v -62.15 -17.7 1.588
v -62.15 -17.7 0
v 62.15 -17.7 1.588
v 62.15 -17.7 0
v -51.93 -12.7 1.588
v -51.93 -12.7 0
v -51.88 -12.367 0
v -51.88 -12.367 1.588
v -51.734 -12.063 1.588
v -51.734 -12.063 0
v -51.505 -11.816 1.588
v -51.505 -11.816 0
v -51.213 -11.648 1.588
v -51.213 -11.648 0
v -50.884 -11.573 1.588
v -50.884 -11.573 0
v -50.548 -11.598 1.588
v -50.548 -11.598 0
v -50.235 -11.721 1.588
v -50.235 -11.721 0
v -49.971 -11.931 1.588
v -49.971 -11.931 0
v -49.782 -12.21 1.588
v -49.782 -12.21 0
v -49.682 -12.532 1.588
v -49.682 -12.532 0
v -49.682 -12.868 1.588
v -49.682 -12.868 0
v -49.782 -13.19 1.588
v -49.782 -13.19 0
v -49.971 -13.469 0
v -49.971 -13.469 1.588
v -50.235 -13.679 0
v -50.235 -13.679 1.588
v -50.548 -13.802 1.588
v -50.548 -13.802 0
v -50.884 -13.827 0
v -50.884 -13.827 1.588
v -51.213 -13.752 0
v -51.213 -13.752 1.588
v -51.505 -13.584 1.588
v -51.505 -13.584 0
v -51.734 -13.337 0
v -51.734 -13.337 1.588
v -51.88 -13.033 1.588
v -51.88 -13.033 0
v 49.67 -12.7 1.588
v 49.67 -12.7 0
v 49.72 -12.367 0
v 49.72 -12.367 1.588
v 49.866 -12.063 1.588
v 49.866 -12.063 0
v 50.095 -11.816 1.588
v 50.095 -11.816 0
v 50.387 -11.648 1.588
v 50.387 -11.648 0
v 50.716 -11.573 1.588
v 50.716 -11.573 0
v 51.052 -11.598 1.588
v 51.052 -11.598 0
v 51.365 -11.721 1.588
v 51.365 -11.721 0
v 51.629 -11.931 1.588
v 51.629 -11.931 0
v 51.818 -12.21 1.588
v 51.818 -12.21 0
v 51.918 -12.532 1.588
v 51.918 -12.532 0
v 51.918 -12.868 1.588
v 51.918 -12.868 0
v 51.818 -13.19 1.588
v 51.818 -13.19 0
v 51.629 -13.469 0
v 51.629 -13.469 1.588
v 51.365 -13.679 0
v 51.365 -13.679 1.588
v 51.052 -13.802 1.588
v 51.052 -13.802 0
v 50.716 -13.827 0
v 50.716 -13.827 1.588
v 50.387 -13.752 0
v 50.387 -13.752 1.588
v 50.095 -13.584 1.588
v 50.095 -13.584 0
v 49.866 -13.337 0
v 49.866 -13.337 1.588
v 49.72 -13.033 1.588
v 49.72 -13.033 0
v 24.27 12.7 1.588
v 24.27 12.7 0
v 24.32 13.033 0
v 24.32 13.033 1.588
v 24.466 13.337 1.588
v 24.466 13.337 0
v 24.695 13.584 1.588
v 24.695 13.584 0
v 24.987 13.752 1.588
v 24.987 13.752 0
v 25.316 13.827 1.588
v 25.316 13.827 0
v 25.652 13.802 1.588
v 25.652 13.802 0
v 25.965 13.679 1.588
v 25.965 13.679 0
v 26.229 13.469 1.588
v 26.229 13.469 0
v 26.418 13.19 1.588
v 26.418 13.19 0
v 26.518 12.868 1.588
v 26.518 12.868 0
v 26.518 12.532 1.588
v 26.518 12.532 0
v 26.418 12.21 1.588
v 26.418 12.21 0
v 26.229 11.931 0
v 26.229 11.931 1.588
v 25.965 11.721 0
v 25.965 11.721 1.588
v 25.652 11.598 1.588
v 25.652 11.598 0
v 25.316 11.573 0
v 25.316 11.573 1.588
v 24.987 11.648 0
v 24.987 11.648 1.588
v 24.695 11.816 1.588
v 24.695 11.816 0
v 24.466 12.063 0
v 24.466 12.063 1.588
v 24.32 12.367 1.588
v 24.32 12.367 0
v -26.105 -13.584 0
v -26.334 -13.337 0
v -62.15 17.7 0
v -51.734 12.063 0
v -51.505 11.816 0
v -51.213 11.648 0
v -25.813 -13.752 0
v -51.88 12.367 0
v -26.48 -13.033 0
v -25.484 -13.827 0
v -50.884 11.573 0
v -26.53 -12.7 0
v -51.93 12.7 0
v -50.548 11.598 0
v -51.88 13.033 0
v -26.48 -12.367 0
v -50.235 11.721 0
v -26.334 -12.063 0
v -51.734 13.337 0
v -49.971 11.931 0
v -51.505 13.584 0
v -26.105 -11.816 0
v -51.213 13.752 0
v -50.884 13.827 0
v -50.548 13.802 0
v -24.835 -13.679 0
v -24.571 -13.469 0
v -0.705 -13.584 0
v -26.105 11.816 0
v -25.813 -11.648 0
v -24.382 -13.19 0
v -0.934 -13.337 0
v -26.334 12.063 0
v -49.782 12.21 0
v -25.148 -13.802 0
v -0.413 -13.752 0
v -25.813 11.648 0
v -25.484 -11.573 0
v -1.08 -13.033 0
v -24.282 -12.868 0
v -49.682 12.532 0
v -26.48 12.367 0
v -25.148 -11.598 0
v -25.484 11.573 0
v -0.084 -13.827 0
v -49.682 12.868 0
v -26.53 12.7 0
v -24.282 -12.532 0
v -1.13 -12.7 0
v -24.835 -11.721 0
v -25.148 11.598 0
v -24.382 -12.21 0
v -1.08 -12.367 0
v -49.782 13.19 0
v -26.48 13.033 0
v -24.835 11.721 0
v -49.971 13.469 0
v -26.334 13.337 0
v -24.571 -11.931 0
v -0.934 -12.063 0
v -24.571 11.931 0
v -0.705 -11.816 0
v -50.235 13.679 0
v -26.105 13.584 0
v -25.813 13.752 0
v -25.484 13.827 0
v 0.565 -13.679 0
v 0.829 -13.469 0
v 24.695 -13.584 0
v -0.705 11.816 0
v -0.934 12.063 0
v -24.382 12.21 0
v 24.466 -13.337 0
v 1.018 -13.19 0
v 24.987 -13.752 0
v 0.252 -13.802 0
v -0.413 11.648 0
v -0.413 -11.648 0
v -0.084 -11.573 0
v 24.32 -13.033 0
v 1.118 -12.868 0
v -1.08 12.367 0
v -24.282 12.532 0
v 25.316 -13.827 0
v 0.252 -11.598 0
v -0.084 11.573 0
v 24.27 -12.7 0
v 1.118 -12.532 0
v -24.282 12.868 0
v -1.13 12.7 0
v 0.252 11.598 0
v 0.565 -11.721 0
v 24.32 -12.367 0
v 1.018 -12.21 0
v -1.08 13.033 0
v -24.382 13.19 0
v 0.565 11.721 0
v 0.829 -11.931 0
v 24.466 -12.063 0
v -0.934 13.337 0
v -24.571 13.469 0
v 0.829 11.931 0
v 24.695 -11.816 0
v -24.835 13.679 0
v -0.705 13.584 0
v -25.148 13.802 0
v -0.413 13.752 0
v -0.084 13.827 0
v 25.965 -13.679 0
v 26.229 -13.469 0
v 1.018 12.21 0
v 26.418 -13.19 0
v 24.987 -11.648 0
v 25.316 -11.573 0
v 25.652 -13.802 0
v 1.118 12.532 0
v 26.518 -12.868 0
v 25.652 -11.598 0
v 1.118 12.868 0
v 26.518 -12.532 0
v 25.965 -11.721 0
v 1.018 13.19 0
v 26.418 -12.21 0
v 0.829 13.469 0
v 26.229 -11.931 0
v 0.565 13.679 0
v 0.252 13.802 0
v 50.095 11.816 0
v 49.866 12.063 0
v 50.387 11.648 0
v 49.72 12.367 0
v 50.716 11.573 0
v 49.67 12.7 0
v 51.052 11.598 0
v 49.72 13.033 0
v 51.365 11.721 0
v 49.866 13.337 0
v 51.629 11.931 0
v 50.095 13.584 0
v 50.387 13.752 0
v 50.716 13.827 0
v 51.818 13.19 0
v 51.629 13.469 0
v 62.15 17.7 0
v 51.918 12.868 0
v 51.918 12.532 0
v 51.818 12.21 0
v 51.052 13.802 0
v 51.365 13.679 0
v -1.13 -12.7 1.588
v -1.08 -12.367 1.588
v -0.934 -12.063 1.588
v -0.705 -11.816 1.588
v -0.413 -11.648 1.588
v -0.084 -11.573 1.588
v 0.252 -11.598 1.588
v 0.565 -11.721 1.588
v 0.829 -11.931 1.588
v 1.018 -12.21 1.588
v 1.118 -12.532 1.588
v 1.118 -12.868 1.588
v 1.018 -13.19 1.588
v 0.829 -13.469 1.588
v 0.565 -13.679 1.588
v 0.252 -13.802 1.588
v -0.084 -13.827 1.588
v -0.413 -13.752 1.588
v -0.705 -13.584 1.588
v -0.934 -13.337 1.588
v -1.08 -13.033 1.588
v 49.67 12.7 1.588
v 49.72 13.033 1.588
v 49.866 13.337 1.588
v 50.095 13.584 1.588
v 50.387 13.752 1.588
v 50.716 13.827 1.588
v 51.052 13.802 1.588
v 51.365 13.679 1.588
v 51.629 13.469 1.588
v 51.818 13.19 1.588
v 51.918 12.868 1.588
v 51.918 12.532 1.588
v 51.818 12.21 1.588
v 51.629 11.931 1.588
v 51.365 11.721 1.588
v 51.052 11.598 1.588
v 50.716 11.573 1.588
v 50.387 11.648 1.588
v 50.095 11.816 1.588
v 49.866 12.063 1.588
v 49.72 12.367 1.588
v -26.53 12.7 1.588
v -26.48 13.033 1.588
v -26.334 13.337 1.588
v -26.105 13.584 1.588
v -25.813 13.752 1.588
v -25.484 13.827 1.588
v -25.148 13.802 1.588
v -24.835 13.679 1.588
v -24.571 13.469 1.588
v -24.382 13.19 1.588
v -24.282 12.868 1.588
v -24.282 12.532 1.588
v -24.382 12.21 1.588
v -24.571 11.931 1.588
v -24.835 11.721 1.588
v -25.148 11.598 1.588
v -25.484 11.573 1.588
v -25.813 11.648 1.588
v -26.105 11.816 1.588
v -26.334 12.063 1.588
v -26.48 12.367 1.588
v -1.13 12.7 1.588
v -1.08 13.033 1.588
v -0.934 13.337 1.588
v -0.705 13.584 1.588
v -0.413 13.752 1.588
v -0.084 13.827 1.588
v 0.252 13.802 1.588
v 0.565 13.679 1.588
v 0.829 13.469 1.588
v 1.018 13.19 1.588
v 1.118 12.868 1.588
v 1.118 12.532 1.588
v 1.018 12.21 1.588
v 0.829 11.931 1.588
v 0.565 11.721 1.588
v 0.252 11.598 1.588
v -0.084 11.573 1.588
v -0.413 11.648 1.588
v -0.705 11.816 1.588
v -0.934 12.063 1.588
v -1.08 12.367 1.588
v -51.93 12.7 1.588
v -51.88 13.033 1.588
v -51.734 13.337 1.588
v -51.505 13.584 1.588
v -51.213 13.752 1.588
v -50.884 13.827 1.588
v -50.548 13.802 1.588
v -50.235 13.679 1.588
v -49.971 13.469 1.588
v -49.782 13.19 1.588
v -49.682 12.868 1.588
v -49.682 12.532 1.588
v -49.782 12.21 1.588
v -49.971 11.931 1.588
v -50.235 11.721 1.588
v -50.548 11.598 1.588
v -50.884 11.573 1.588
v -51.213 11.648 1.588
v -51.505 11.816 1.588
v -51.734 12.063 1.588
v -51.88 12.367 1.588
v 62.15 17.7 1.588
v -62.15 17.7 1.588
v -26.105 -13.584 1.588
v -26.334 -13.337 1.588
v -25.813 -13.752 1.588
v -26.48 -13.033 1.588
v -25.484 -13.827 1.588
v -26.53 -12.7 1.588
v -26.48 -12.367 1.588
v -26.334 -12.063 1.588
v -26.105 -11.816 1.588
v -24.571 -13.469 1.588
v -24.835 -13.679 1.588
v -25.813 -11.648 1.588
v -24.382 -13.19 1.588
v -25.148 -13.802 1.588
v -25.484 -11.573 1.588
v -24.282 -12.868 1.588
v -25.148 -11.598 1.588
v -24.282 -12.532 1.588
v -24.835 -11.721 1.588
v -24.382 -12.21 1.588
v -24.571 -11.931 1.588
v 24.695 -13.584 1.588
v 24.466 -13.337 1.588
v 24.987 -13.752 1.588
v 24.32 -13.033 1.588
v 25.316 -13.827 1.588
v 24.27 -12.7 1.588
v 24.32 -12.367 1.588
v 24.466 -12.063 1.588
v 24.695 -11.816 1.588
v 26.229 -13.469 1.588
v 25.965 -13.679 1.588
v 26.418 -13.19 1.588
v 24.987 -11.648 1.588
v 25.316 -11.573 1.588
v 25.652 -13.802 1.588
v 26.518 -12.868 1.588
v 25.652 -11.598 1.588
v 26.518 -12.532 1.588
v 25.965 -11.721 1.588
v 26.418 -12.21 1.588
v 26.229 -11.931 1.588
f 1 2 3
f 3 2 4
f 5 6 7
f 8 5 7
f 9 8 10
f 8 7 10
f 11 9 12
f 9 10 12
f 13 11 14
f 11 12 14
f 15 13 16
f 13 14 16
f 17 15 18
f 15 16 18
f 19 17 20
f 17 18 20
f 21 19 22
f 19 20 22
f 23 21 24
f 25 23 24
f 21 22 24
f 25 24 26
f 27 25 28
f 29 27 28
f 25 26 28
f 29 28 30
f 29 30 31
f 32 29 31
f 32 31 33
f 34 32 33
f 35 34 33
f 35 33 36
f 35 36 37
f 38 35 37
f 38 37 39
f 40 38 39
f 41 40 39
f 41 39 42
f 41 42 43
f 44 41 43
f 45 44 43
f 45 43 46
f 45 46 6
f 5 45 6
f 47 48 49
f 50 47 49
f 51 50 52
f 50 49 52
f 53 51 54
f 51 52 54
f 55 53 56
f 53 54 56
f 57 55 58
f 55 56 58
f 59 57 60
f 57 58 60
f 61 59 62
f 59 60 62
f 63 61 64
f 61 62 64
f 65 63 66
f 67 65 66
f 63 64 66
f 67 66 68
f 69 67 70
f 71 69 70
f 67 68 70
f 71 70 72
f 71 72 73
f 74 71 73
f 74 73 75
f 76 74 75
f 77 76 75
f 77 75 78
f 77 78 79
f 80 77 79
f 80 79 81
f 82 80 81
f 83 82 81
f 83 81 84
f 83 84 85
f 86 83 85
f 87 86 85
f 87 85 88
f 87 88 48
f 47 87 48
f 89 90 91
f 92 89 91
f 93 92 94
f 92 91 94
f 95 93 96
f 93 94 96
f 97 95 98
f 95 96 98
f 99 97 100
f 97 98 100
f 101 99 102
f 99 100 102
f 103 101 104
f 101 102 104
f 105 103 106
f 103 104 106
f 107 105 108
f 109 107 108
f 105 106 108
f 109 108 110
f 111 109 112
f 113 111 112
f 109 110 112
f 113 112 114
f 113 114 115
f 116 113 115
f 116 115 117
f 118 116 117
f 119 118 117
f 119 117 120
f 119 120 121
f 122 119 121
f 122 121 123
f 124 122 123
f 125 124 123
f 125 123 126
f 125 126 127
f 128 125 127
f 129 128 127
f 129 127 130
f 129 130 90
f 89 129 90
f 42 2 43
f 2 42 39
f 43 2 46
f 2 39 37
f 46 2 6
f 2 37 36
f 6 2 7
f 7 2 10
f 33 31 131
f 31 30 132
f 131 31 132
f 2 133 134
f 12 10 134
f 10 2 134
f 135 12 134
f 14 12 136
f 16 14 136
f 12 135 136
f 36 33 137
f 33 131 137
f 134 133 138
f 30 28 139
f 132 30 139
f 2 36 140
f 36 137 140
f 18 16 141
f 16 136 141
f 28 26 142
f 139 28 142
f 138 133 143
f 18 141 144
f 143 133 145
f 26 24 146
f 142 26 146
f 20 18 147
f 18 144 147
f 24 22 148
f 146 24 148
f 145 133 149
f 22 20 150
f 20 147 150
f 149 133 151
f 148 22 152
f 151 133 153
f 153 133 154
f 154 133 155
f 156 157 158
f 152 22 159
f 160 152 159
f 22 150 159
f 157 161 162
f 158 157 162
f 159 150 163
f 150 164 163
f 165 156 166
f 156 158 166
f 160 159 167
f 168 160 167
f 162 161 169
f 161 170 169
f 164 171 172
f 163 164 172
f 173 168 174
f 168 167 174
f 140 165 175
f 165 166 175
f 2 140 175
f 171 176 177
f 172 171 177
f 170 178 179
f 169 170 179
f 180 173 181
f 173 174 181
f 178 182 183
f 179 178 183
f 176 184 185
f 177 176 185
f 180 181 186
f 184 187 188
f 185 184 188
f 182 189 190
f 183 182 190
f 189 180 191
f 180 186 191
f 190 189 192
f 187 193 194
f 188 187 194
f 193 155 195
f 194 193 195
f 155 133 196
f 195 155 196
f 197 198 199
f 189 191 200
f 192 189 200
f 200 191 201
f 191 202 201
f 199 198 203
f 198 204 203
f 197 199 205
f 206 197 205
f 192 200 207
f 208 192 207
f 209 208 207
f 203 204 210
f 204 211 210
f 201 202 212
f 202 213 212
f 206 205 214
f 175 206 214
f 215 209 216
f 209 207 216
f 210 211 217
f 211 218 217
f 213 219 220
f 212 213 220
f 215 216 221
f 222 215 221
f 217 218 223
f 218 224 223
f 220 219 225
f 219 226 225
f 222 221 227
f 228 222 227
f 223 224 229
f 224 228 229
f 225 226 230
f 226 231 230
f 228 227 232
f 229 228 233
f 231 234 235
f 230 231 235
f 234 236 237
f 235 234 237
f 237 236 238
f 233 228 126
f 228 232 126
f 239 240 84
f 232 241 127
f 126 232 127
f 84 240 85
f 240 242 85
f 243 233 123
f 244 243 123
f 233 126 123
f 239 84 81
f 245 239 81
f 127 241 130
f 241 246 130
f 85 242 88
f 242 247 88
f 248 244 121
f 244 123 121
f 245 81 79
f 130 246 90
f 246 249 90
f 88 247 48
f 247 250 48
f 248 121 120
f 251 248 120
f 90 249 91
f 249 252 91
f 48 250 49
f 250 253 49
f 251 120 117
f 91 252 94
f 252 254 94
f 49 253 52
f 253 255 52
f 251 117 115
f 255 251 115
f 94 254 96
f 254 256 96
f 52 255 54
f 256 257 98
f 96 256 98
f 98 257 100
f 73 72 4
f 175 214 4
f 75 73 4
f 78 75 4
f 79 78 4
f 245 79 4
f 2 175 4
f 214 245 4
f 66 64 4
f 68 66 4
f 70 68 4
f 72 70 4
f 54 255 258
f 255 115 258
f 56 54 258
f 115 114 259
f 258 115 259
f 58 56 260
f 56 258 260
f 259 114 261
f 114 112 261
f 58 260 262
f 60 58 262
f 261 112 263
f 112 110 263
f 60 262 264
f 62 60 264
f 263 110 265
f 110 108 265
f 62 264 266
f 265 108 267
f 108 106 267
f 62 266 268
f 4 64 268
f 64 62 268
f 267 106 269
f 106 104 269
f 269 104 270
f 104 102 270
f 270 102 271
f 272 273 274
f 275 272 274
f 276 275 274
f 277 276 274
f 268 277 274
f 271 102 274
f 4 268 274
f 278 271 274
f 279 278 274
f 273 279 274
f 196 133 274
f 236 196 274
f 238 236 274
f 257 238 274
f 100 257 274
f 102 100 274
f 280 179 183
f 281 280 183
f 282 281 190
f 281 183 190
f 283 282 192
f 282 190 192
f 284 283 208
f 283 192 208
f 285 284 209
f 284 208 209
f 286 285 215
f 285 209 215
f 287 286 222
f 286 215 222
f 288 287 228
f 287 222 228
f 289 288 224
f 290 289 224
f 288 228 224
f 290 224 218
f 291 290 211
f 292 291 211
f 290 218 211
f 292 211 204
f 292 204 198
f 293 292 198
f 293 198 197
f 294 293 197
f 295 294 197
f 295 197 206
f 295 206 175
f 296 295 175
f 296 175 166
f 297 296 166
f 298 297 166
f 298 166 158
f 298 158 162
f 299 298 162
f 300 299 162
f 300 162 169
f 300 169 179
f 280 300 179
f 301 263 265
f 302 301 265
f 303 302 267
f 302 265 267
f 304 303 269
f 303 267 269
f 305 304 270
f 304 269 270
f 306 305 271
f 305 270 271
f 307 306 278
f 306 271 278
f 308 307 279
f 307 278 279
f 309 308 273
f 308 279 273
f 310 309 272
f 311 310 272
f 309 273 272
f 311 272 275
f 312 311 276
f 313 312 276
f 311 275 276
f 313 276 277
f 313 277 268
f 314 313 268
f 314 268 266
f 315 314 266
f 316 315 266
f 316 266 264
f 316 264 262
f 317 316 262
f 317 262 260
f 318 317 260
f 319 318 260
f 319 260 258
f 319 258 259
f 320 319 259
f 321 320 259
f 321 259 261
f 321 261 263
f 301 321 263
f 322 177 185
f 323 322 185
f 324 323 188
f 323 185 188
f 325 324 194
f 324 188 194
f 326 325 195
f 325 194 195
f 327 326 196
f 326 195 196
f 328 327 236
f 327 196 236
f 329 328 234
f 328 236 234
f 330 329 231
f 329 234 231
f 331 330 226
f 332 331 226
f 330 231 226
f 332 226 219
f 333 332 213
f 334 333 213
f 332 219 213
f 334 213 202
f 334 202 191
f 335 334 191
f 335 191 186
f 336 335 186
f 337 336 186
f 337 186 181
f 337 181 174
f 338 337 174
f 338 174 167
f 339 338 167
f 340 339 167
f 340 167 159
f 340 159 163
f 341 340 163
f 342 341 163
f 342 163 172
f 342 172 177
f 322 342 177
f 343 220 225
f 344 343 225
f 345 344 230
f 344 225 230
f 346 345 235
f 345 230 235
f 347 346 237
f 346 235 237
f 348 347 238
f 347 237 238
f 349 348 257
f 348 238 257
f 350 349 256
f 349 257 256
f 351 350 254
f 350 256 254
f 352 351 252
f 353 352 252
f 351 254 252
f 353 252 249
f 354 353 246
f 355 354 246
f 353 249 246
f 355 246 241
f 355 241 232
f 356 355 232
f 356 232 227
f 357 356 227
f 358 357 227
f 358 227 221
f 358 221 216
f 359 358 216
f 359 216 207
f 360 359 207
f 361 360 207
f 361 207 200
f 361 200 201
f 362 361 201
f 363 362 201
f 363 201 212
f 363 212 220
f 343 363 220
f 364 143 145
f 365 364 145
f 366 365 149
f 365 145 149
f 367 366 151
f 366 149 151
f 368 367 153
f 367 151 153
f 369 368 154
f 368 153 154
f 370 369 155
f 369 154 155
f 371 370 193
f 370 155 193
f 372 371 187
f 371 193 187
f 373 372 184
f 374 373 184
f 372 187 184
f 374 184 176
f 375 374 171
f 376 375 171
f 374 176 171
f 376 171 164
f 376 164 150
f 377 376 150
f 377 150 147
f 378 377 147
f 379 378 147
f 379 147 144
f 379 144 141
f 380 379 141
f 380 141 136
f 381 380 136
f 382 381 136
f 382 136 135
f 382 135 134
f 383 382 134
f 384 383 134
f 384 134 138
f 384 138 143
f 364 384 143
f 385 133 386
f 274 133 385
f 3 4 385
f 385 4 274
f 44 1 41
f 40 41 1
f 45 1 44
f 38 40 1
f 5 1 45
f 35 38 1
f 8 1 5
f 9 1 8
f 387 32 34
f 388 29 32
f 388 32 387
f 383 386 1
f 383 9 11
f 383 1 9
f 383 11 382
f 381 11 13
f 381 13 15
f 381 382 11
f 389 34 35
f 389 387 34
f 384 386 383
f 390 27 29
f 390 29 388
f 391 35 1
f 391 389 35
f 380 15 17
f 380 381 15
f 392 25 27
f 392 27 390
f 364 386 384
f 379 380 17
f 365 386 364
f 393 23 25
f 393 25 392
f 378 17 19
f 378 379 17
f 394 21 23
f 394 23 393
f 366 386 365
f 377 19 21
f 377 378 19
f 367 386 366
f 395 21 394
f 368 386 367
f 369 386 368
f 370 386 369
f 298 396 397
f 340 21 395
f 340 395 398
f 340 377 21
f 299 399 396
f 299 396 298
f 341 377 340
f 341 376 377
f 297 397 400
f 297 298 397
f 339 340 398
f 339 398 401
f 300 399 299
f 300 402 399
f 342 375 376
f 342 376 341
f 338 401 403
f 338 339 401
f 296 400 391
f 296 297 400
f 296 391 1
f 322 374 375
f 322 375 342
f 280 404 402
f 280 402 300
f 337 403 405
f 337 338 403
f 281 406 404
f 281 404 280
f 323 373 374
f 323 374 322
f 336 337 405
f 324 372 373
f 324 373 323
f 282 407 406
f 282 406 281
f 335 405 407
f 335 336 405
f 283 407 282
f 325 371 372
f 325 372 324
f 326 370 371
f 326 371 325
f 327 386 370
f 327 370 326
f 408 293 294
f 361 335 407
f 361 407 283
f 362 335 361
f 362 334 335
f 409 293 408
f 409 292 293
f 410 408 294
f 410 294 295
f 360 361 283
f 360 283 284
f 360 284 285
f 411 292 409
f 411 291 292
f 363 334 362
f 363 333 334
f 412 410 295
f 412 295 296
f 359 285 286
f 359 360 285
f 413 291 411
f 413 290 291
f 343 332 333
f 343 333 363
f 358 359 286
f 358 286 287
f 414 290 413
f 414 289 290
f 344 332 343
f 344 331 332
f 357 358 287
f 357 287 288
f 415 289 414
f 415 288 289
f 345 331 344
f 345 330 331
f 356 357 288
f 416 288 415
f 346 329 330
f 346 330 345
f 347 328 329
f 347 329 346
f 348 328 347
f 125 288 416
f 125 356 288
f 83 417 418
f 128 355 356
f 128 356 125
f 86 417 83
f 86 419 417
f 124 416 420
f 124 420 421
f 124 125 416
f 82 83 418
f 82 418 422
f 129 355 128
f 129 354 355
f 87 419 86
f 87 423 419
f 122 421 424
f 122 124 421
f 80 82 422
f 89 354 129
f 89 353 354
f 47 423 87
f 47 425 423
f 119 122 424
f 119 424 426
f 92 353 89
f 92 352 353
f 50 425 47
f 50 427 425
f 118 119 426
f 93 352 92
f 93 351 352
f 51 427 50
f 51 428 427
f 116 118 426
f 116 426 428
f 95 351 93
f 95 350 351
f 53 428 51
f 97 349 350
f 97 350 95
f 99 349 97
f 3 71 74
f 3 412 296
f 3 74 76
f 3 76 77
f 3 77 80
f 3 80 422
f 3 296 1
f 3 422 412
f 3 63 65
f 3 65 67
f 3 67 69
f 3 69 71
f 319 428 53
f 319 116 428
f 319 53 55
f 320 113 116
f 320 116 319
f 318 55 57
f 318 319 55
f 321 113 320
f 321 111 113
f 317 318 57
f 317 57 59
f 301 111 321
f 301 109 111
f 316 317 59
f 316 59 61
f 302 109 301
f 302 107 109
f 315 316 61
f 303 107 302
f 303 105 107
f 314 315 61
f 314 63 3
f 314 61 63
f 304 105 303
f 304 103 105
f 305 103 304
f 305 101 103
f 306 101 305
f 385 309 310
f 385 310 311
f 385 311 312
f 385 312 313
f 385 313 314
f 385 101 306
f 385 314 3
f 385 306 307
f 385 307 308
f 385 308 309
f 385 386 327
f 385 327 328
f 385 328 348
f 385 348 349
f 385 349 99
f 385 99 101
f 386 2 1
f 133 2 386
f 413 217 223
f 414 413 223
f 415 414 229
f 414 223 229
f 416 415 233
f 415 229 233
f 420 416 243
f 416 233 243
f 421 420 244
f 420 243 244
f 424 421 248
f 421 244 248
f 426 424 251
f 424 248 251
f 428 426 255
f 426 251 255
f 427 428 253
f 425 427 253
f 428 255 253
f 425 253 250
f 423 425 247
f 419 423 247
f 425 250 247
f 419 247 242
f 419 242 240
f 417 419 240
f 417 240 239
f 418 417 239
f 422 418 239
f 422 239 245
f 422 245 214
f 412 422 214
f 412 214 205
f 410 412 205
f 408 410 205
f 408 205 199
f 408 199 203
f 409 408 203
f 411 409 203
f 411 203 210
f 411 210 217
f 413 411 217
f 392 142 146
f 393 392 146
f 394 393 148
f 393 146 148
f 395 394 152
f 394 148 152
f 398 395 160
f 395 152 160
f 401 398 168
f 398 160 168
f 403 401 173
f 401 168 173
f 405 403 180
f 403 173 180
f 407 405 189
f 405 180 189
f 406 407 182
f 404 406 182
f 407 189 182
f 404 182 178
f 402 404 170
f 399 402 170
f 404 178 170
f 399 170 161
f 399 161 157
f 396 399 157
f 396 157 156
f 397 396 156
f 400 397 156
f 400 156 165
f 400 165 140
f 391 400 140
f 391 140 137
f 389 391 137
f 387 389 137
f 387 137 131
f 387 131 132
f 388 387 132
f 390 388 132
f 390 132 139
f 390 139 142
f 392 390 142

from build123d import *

# Parameters (mm, degrees)
SKETCH1_W             = 124.3
SKETCH1_H             = 35.4
BOSS_EXTRUDE1_DEPTH   = 1.5875
F_4_40_TAPPED_HOLE1_D = 2.2606
LPATTERN1_COUNT       = 5
LPATTERN1_PITCH       = 25.4


with BuildPart() as part:
    # Sketch1 → Boss-Extrude1 (new body)
    with BuildSketch(Plane.XY):
        Rectangle(SKETCH1_W, SKETCH1_H)
    extrude(amount=BOSS_EXTRUDE1_DEPTH)

    # #4-40 Tapped Hole1 (through all)
    with Locations(Plane(origin=(-50.8, 12.7, 1.5875), x_dir=(1, 0, 0), z_dir=(0, 0, 1))):
        with Locations((0, 0), (0, -25.4)):
            f_4_40_tapped_hole1 = Hole(F_4_40_TAPPED_HOLE1_D / 2)

    # LPattern1: #4-40 Tapped Hole1 ×5
    with Locations(*[(i * LPATTERN1_PITCH, 0, 0) for i in range(1, LPATTERN1_COUNT)]):
        add(f_4_40_tapped_hole1, mode=Mode.SUBTRACT)


solid = part.part
